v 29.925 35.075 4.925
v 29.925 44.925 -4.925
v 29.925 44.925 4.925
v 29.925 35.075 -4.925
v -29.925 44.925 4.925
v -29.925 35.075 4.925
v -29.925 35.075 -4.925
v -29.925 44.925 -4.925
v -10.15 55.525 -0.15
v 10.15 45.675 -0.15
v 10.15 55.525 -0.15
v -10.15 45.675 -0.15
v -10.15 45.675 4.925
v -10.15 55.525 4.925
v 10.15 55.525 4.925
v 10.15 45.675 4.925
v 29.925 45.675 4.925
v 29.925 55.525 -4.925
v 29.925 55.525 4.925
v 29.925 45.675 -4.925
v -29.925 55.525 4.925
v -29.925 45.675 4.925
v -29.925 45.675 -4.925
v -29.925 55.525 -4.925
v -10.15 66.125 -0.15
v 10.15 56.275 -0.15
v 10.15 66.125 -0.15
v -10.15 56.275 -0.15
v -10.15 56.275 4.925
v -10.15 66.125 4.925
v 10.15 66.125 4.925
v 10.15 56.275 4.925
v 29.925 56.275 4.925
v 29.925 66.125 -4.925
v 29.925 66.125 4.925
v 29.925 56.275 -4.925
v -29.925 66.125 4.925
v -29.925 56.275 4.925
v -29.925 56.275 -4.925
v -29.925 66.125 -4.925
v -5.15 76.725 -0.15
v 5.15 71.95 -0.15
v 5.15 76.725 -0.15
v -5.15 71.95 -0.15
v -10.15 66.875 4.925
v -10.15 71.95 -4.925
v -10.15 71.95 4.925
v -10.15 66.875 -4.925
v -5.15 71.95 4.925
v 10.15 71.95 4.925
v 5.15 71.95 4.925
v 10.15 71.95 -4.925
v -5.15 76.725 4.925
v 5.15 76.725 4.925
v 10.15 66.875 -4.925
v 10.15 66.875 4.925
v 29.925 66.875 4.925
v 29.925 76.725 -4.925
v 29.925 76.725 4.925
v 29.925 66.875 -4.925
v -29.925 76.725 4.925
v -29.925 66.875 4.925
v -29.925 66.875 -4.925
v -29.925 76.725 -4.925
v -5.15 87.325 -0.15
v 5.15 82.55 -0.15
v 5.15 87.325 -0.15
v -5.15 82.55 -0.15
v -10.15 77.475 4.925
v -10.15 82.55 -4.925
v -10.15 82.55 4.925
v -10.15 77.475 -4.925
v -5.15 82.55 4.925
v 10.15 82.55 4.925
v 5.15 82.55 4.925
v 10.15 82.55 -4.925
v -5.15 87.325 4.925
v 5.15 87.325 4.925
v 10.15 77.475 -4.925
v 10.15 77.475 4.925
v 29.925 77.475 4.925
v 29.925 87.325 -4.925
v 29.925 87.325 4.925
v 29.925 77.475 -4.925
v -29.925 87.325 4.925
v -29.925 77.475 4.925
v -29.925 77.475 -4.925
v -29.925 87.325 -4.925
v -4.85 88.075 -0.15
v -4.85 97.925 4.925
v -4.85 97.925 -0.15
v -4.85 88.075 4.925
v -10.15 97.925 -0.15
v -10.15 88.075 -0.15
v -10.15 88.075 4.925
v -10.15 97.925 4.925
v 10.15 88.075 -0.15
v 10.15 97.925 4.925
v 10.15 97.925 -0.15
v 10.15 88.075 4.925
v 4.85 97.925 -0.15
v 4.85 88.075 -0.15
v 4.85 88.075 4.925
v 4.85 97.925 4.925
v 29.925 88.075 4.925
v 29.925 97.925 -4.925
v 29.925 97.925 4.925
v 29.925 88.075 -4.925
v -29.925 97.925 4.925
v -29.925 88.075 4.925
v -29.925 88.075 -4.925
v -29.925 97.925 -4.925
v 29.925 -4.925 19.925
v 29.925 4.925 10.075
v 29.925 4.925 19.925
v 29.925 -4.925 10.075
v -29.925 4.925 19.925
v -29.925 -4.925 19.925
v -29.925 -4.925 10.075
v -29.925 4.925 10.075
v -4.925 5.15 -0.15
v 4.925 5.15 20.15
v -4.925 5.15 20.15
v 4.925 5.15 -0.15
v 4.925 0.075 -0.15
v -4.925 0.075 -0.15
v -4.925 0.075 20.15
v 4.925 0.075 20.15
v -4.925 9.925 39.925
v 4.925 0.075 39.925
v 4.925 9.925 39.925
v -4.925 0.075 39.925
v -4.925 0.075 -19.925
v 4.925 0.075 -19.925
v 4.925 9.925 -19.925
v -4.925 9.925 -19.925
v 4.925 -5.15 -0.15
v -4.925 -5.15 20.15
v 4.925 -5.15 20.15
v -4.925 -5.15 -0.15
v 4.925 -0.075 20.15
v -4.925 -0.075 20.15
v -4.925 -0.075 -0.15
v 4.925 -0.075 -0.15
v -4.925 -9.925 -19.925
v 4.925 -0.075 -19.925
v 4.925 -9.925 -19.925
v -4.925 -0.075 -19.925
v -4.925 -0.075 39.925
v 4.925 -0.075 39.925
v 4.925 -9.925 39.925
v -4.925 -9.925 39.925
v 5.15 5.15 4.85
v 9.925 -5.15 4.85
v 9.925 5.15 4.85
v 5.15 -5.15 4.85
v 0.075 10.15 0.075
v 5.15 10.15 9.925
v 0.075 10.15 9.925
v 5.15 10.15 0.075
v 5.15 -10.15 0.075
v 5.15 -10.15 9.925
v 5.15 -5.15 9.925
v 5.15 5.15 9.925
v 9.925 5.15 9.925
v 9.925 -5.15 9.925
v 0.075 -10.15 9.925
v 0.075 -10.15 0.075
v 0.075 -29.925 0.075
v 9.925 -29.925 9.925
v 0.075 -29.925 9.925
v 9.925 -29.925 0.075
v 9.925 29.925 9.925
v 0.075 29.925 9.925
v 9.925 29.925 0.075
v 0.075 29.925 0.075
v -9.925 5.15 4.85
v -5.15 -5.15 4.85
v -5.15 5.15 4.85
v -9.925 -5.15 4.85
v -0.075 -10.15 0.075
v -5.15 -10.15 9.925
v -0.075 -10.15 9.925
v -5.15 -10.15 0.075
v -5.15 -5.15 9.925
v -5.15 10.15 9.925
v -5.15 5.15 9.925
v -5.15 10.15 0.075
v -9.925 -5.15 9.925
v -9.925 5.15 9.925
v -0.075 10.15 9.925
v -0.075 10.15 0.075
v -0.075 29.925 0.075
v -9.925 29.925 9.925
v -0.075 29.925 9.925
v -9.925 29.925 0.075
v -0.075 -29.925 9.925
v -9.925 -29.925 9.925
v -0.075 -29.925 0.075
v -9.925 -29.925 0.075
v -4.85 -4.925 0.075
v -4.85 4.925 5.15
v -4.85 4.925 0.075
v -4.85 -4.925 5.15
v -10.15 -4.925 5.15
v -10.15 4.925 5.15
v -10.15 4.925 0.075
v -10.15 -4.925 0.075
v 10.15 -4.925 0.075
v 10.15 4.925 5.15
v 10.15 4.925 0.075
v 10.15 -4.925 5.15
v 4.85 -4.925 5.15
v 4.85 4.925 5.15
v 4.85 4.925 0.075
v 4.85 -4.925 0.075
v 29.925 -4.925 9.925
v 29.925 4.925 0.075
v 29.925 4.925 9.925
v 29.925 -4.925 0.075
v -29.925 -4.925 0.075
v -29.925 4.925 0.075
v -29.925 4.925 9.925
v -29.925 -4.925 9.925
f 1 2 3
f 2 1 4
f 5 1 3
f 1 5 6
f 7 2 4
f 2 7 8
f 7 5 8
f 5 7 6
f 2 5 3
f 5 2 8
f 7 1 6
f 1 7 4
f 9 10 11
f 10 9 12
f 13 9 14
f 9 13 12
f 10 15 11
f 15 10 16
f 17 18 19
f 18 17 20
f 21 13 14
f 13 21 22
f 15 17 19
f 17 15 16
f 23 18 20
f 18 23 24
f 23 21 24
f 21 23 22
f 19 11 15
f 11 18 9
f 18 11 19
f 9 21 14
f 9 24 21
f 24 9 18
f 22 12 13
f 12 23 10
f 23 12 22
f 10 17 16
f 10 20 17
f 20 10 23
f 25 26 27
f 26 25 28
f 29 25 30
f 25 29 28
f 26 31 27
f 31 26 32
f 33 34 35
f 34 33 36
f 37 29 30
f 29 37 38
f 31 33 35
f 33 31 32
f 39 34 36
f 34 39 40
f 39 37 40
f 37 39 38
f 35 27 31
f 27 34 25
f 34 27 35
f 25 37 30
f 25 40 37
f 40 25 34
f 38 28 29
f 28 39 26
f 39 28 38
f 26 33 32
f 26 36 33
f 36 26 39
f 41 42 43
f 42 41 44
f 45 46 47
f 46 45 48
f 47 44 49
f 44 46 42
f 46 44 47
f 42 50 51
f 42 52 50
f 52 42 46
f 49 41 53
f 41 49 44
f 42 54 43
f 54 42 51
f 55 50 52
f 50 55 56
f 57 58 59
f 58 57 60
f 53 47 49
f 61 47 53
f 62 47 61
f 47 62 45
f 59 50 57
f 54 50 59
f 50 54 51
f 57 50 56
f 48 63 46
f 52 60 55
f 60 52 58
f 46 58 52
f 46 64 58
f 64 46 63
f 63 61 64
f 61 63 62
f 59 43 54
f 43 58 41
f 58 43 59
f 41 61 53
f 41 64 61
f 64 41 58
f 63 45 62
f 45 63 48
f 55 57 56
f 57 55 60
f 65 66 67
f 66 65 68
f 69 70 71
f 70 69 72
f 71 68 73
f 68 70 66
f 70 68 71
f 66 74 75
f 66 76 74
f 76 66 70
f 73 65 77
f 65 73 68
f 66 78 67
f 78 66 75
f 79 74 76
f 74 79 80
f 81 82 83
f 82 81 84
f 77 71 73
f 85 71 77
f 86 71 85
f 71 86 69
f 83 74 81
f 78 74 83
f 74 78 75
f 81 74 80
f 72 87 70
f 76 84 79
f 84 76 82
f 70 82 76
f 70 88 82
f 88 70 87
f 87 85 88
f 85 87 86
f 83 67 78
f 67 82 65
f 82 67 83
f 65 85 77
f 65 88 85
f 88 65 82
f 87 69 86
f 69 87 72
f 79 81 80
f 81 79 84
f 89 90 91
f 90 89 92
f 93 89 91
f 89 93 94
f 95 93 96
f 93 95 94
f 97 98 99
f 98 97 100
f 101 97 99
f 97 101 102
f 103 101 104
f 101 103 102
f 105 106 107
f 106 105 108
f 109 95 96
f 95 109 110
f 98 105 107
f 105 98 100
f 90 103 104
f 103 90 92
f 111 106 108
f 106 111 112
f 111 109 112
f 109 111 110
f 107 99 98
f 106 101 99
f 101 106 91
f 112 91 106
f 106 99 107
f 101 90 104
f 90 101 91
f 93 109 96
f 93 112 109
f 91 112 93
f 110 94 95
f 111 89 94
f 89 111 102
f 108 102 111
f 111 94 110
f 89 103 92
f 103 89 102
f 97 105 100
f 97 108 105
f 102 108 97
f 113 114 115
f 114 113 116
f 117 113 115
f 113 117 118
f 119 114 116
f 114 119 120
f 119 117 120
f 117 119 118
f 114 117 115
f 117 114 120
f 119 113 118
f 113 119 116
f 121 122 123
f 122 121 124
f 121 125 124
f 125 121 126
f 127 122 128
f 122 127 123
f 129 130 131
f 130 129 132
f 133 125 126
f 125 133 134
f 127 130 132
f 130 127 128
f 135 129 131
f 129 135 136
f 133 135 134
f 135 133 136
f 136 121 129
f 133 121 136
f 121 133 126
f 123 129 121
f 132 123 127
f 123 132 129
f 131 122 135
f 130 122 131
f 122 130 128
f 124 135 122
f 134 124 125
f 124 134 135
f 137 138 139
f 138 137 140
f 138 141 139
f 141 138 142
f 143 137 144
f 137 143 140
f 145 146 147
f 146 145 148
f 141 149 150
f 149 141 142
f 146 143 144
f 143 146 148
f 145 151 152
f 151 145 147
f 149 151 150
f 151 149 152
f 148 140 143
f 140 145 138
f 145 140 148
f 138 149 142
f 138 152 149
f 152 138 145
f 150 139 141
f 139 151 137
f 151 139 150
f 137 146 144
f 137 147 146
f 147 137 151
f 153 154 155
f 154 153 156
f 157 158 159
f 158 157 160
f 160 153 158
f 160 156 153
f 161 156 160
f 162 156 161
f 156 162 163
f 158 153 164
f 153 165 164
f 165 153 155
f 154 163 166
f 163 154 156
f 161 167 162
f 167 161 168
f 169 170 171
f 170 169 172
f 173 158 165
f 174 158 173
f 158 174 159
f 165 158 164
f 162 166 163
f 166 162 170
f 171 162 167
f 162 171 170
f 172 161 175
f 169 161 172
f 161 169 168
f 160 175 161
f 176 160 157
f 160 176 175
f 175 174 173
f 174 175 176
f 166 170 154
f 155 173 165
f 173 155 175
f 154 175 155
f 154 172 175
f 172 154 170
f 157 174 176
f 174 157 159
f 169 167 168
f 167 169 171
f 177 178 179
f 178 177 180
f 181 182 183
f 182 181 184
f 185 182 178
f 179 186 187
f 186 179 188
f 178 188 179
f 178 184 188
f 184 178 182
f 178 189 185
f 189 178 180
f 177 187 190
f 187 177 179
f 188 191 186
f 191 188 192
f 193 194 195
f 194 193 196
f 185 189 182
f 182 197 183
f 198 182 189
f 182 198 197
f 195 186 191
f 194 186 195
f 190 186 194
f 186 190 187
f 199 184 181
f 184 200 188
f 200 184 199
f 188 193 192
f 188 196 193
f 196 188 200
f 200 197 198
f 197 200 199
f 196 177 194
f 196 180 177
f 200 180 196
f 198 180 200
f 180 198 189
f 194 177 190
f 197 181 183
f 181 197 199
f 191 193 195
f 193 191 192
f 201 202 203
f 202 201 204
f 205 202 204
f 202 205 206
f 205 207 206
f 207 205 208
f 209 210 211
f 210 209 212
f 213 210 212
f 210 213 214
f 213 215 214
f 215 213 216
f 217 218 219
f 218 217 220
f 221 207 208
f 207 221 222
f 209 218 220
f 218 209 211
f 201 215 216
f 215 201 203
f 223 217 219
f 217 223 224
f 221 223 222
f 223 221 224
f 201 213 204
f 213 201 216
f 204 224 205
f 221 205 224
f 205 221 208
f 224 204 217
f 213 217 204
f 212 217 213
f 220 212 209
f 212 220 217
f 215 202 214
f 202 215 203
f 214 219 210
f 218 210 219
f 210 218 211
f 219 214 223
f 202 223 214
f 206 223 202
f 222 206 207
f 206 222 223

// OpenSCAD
Unit=5;
Slack=.3; // 0.3 for printing, 3 for viewing solution
Laengde=12*Unit;
Bredde=2*Unit;
keys = [[0,0,0,0,0,0,0,0],
        [2,2,2,2,0,0,0,0],
        [2,2,2,2,0,0,0,0],
        [1,2,2,1,1,1,1,1],
        [1,2,2,1,1,1,1,1],
        [2,0,0,2,0,0,0,0]];
        
module cut(key){
    for (i = [0:3]) {
        if (key[i]!=0) {
            translate([(i)*Unit,-Unit,0])
            cube([Unit+Slack,key[i]*Unit+Slack,Unit+Slack],center=false);
        }
    }
    for (i = [4:7]) {
        if (key[i]!=0) {
            translate([(i-4)*Unit,-Unit,-Unit])
            cube([Unit+Slack,key[i]*Unit+Slack,Unit+Slack],center=false);
        }
    }
}

module pind(){
cube([Laengde-Slack/2,Bredde-Slack/2,Bredde-Slack/2], center = true);
} 

module stick(key) {
    difference(){
    pind();
    translate([-2*Unit-Slack/2,-Slack/2,-Slack/2])
        cut(key);
    }
}

translate([0,40,0])
for (i = [0:5] ) {
translate([0,i*2*(Unit+Slack),0])
stick(keys[i]);
}



// Comment out (*) for printing sticks
 translate([0,0,0]){
translate([0,0,3*Unit])
  rotate(0,[0,0,1])      
      rotate(0,[1,0,0])      
        stick(keys[0]); // 1

translate([0,Unit,2*Unit])
  rotate(90,[0,0,1])      
      rotate(-90,[0,1,0])      
        stick(keys[1]); // 5

translate([0,-1*Unit,2*Unit])
  rotate(90,[0,0,1])      
      rotate(90,[0,1,0])      
        stick(keys[2]); // 3

translate([1*Unit,0*Unit,1*Unit])
  rotate(-90,[0,0,1])      
      rotate(-0,[1,0,0])      
        stick(keys[3]); // 2

translate([-1*Unit,0,1*Unit])
  rotate(90,[0,0,1])      
      rotate(0,[1,0,0])      
        stick(keys[4]); // 4

translate([0*Unit,0*Unit,1*Unit])
  rotate(-0,[0,0,1])
    rotate(-0,[0,1,0])      
      rotate(180,[1,0,0])      
            stick(keys[5]); // 6

}
